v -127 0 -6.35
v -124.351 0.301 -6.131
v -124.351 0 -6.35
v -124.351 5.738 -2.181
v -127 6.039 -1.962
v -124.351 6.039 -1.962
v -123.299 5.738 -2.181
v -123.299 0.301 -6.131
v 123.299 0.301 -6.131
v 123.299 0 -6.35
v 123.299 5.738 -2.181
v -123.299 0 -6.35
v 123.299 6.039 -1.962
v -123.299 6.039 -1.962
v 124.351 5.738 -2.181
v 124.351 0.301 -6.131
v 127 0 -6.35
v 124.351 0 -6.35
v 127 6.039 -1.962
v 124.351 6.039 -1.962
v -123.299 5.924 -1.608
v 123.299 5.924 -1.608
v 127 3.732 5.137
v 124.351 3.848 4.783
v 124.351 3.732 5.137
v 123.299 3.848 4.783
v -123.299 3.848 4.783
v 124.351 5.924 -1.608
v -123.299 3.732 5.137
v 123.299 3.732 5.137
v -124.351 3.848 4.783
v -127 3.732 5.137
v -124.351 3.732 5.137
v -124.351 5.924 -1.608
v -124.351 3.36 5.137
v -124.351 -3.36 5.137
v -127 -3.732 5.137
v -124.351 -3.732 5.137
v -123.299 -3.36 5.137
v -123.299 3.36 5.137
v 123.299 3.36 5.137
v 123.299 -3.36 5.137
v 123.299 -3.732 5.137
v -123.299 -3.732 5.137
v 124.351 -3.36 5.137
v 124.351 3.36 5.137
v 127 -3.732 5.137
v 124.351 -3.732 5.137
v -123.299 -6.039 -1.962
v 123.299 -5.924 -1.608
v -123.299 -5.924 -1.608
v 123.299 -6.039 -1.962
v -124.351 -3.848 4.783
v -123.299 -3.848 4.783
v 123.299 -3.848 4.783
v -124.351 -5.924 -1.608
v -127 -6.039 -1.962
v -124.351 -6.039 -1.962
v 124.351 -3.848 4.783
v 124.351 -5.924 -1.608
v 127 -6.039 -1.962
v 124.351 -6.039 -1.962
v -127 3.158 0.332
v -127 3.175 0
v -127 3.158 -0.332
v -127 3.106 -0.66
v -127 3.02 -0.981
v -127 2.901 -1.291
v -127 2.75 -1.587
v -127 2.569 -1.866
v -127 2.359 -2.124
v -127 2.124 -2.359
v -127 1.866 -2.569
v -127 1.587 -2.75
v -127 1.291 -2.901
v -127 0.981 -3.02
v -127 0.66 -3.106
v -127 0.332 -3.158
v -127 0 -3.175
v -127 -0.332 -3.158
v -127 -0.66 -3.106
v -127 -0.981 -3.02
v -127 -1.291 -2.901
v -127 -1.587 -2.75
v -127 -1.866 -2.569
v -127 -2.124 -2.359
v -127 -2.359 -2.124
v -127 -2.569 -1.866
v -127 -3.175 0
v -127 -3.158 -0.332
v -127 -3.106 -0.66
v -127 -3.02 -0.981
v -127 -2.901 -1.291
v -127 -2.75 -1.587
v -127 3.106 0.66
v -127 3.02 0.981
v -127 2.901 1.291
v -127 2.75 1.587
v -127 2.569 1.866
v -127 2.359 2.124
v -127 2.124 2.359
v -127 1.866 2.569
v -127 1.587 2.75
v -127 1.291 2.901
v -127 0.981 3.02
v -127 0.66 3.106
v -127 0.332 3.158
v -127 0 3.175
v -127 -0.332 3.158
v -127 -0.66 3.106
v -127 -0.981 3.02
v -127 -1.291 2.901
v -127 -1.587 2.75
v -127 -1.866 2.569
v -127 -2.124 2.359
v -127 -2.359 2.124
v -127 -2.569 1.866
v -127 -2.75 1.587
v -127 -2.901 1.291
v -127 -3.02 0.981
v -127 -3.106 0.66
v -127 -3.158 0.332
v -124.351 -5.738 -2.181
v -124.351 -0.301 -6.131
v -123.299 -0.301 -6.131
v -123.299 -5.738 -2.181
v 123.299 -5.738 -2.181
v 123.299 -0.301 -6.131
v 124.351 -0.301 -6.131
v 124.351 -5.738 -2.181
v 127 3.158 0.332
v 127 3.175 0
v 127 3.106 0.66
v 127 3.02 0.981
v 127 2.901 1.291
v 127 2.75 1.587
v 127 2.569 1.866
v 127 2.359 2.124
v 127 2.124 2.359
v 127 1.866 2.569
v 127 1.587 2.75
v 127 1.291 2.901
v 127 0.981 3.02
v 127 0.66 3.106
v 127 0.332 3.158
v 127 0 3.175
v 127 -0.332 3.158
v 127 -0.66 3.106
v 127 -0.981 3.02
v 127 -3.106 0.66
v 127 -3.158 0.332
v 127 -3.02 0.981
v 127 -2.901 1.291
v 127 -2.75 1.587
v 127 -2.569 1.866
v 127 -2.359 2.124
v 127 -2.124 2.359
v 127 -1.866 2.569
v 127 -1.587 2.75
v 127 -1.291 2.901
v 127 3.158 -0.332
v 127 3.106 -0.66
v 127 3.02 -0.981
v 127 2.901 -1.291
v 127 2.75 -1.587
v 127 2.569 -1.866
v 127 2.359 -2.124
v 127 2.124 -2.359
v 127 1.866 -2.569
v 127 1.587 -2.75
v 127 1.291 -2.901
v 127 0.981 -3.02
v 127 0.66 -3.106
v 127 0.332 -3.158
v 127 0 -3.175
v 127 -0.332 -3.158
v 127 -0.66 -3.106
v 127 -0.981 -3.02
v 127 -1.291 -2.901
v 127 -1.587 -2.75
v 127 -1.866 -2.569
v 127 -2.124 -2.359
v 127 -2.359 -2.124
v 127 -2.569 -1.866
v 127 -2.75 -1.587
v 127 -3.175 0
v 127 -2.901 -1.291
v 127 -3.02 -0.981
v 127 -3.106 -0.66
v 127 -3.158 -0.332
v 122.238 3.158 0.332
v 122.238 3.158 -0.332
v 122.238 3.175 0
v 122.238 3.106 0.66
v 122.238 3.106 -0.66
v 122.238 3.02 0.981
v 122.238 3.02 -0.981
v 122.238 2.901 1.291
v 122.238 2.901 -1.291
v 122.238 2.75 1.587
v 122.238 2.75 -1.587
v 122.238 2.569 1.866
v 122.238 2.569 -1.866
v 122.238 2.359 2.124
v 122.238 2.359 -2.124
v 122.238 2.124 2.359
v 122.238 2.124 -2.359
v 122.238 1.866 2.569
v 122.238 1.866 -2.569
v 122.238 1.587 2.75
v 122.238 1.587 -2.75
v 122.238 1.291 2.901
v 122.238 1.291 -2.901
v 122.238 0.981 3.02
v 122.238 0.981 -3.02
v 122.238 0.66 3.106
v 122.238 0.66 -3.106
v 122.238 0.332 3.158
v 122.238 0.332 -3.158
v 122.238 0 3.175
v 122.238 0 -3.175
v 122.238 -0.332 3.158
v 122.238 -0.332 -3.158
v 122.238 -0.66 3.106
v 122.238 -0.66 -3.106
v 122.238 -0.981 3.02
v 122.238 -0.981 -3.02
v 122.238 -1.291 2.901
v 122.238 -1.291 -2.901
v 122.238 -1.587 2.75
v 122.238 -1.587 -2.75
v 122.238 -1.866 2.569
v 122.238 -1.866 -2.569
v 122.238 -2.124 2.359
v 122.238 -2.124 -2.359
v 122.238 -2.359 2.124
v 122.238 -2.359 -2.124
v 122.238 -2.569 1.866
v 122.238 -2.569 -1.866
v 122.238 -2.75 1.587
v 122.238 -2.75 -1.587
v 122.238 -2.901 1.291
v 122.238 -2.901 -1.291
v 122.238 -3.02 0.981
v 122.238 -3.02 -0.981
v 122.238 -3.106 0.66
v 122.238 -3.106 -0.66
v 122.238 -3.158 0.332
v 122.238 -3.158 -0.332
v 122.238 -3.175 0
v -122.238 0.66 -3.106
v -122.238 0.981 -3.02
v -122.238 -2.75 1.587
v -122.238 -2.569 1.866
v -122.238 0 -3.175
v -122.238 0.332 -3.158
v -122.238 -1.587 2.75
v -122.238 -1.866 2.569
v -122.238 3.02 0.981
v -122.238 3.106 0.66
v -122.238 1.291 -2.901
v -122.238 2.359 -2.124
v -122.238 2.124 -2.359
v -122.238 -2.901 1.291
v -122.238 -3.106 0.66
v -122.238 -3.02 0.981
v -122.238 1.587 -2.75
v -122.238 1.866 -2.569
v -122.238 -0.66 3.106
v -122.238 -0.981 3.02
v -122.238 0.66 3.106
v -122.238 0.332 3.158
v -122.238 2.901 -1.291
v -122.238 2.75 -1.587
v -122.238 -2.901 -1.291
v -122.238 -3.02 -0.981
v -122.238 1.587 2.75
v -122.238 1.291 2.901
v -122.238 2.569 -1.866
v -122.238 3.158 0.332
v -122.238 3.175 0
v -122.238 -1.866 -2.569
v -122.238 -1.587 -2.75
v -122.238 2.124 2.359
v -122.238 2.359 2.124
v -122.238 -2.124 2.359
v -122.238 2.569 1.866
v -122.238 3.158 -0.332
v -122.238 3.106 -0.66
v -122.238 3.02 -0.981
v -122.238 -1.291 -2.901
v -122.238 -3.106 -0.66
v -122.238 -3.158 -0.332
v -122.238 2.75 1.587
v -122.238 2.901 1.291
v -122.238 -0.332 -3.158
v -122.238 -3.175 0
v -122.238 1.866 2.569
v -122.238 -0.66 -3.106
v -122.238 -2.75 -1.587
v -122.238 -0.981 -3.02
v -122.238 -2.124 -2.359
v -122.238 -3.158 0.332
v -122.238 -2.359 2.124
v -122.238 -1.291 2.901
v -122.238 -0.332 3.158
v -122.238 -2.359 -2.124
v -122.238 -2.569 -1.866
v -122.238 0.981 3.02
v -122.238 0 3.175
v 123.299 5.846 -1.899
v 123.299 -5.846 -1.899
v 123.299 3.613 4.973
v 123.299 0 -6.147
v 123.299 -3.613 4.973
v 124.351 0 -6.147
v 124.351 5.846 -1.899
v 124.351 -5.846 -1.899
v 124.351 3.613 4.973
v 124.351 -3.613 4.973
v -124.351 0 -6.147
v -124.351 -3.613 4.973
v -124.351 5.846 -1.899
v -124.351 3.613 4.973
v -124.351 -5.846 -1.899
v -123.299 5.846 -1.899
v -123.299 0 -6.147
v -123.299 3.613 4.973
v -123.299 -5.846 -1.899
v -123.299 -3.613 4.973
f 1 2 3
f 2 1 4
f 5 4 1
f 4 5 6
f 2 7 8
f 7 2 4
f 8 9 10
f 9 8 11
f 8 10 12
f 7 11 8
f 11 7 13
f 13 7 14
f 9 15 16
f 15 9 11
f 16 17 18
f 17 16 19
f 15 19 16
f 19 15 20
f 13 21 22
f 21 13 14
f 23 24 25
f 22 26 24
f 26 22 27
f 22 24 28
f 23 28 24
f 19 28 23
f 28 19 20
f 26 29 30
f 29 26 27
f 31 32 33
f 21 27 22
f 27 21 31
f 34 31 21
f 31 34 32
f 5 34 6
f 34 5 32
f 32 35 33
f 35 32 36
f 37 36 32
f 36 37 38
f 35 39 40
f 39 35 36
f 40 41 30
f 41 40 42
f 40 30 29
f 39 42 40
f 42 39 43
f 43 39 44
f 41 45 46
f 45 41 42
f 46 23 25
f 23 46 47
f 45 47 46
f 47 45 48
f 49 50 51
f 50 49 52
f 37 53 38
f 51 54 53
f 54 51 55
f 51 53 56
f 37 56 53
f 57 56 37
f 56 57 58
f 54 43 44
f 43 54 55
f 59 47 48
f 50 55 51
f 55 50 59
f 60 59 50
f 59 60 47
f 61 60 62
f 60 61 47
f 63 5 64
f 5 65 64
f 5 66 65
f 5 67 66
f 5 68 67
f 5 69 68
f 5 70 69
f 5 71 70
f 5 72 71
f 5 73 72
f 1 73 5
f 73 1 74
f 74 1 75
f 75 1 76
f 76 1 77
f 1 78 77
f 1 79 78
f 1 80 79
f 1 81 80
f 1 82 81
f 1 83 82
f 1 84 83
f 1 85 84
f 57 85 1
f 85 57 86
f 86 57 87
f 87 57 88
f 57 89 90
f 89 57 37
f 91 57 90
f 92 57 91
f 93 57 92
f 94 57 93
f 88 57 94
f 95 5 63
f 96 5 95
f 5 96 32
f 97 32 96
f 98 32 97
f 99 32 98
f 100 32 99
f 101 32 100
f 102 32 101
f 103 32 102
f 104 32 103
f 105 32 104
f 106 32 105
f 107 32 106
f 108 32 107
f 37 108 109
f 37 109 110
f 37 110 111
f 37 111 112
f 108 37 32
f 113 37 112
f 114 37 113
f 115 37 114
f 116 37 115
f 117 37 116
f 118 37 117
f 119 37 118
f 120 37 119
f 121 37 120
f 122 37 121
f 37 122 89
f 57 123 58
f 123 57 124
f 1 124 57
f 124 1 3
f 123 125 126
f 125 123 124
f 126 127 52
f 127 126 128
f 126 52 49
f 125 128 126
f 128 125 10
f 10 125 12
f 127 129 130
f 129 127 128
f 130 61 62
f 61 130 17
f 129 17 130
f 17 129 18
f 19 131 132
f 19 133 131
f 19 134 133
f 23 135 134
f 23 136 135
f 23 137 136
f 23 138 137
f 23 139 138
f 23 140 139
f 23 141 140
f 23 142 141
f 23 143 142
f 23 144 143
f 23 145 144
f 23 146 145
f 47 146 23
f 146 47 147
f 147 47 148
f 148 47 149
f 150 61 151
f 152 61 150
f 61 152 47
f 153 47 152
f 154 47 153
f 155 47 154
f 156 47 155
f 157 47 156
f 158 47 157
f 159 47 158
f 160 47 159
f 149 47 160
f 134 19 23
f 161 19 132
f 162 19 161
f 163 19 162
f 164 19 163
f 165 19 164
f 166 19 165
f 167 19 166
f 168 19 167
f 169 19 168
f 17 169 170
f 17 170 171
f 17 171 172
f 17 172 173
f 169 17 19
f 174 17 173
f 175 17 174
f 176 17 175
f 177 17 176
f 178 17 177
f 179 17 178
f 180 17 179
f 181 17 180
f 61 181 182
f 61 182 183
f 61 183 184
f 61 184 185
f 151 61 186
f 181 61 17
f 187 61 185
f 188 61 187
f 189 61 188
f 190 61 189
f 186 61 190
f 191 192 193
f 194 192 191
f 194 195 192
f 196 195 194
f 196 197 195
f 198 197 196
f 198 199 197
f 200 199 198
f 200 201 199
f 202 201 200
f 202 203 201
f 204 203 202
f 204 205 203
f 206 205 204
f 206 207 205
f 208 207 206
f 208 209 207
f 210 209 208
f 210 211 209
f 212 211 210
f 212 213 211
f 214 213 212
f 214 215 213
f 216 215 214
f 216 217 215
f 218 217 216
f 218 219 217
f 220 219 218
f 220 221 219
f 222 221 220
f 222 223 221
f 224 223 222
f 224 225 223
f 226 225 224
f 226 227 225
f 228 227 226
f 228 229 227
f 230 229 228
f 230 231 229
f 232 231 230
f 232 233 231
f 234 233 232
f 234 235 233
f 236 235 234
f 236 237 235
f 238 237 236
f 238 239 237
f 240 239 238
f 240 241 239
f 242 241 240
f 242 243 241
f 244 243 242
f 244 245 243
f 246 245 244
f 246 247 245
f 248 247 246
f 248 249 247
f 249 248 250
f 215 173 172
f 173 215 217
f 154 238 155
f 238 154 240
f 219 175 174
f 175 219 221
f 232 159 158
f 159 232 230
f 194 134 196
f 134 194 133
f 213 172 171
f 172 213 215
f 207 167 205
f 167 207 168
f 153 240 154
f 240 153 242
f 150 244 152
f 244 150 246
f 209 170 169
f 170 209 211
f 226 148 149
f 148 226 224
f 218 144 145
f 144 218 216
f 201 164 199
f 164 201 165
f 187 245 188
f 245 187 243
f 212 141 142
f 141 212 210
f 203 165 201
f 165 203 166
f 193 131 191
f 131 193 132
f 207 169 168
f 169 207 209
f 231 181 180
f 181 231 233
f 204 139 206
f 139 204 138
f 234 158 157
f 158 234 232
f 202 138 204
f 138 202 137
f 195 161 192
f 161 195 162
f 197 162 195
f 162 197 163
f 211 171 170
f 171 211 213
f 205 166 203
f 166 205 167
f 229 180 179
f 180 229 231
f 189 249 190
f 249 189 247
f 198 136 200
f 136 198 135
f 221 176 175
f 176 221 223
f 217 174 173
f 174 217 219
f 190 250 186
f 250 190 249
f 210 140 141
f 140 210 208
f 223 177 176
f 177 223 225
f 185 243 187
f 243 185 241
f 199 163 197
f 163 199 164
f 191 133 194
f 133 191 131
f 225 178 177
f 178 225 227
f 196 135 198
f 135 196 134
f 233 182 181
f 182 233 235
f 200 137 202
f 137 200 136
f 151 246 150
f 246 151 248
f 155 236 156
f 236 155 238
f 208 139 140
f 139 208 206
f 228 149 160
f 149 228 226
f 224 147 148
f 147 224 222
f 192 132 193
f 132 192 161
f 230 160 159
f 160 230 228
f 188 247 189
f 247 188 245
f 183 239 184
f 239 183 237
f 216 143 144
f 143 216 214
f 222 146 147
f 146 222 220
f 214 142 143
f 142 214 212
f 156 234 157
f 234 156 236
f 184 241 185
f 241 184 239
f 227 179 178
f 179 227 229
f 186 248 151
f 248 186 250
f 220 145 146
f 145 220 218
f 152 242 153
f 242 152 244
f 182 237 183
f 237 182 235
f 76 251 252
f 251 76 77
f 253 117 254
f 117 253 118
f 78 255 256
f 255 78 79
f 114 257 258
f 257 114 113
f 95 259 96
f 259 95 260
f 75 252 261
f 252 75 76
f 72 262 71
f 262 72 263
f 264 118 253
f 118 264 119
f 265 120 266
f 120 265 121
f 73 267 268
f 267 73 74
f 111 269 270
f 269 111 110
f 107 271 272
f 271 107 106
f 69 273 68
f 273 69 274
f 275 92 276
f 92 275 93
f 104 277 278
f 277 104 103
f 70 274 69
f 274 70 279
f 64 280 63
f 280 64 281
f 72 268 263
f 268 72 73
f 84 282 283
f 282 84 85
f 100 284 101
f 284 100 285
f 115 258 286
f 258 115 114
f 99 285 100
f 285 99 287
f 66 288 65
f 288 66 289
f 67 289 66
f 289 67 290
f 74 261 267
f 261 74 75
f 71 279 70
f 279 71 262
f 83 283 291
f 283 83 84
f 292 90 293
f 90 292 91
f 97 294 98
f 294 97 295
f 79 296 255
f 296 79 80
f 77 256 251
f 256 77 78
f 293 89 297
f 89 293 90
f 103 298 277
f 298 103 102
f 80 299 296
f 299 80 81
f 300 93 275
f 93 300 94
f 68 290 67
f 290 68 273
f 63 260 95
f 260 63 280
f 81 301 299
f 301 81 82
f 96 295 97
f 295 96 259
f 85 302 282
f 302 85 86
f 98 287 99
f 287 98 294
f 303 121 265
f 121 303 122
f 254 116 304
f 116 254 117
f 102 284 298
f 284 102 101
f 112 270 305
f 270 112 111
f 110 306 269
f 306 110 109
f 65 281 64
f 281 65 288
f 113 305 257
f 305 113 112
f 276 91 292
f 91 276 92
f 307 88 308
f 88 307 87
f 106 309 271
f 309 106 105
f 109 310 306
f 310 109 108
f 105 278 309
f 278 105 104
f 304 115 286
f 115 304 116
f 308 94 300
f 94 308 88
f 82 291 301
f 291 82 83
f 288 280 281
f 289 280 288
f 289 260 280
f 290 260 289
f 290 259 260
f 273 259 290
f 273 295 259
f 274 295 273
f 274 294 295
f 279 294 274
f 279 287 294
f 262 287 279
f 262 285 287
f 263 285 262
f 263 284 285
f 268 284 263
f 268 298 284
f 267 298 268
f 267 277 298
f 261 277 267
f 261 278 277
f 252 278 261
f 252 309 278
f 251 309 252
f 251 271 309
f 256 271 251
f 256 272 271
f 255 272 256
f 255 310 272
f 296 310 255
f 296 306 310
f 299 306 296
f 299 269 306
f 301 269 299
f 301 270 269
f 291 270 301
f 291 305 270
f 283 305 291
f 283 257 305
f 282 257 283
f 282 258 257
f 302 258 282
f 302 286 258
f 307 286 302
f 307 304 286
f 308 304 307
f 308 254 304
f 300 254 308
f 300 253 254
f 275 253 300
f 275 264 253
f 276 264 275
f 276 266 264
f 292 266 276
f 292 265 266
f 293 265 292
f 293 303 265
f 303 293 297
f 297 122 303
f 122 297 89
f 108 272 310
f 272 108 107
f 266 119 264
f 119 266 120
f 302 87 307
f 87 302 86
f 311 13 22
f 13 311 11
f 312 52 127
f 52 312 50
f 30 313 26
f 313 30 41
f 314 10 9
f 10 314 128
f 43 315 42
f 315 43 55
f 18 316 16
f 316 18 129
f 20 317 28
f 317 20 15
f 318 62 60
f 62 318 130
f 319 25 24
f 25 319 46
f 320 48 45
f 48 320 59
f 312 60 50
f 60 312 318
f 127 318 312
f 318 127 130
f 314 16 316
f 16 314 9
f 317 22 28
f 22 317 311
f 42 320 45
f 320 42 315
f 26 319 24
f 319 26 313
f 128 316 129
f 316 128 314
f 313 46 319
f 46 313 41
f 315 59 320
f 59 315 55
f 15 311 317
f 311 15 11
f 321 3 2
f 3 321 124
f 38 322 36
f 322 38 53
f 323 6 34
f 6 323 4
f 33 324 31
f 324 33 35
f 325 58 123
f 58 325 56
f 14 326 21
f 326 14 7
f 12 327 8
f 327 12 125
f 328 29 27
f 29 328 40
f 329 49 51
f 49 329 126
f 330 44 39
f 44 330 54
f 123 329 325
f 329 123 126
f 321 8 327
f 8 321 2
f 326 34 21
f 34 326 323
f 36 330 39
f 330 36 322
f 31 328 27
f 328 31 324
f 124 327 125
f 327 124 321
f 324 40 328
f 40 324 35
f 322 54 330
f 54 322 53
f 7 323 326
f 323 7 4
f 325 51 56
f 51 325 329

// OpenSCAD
/*[Basic Shaft dimensions]*/

//Type of shaft:
ShaftType = "Hex"; //[Hex, Round]
//Total length of the shaft:
TotalLength = 10;
//The size of the shaft:
ShaftSize = 0.5;

/*[Snap Rings]*/

//Turns snap ring grooves on or off:
Snapring = "On"; //[On, Off]
//Distance between inside edges of both snap rings (Same as total length if you do not want snap rings):
InsideLength = 9.875;


/*[Encoders]*/

//Turns Encoder holes on or off:
EncoderHoles = "On"; //[On, Off]
//Toggle between encoder holes on both sides, or only on one:
BothSides = "On"; //[On, Off]
//Depth of the hole for your encoder:
EncoderHoleDepth = .375;
//Diameter of the shaft of your encoder:
EncoderShaftDiameter = .25;

/*[hidden]*/
GrooveDepth = ShaftSize/31.25;
GrooveWidth = ShaftSize/12.075;
SnapRingOffset = (TotalLength - InsideLength);

module Shaft() {
    if (ShaftType == "Hex") {
            rotate([0, 90, 0]) scale([25.4, 25.4, 25.4])
            cylinder(h=TotalLength, d=ShaftSize, $fa=60, center = true);
        }
    else if (ShaftType == "Round") {
            rotate([0, 90, 0]) scale([25.4, 25.4, 25.4])
            cylinder(h=TotalLength, d=ShaftSize, $fn = 60, center = true);
        }
    }
module EncoderHole() {
    if(EncoderHoles == "On") {
        difference() {
            Shaft();
            rotate([0, 90, 0]) scale([25.4, 25.4, 25.4]) translate([0, 0, TotalLength/2])
                cylinder(h = EncoderHoleDepth, d = EncoderShaftDiameter, $fn = 60, center = true);
            if(BothSides == "On") {
            rotate([0, 90, 0]) scale([25.4, 25.4, 25.4]) translate([0, 0, -TotalLength/2])
                cylinder(h = EncoderHoleDepth, d = EncoderShaftDiameter, $fn = 60, center = true);
        }
        }  
    }
}

module  Grooves(){
    if (Snapring == "On"){
        difference() {
            rotate([0, 90, 0]) scale([25.4, 25.4, 25.4]) translate([0, 0, TotalLength/2-SnapRingOffset])
                cylinder(h = GrooveWidth, d = ShaftSize, $fn = 60, center = true);
            rotate([0, 90, 0]) scale([25.4, 25.4, 25.4]) translate([0, 0, TotalLength/2-SnapRingOffset])
                cylinder(h = GrooveWidth, d = ShaftSize-GrooveDepth, $fn = 60, center = true);
        }
        difference() {
            rotate([0, 90, 0]) scale([25.4, 25.4, 25.4]) translate([0, 0, -TotalLength/2+SnapRingOffset])
                cylinder(h = GrooveWidth, d = ShaftSize, $fn = 60, center = true);            
            rotate([0, 90, 0]) scale([25.4, 25.4, 25.4]) translate([0, 0, -TotalLength/2+SnapRingOffset])
                cylinder(h = GrooveWidth, d = ShaftSize-GrooveDepth, $fn = 60, center = true);
        }
}
}
    difference() {
    EncoderHole();
    Grooves();
        }
